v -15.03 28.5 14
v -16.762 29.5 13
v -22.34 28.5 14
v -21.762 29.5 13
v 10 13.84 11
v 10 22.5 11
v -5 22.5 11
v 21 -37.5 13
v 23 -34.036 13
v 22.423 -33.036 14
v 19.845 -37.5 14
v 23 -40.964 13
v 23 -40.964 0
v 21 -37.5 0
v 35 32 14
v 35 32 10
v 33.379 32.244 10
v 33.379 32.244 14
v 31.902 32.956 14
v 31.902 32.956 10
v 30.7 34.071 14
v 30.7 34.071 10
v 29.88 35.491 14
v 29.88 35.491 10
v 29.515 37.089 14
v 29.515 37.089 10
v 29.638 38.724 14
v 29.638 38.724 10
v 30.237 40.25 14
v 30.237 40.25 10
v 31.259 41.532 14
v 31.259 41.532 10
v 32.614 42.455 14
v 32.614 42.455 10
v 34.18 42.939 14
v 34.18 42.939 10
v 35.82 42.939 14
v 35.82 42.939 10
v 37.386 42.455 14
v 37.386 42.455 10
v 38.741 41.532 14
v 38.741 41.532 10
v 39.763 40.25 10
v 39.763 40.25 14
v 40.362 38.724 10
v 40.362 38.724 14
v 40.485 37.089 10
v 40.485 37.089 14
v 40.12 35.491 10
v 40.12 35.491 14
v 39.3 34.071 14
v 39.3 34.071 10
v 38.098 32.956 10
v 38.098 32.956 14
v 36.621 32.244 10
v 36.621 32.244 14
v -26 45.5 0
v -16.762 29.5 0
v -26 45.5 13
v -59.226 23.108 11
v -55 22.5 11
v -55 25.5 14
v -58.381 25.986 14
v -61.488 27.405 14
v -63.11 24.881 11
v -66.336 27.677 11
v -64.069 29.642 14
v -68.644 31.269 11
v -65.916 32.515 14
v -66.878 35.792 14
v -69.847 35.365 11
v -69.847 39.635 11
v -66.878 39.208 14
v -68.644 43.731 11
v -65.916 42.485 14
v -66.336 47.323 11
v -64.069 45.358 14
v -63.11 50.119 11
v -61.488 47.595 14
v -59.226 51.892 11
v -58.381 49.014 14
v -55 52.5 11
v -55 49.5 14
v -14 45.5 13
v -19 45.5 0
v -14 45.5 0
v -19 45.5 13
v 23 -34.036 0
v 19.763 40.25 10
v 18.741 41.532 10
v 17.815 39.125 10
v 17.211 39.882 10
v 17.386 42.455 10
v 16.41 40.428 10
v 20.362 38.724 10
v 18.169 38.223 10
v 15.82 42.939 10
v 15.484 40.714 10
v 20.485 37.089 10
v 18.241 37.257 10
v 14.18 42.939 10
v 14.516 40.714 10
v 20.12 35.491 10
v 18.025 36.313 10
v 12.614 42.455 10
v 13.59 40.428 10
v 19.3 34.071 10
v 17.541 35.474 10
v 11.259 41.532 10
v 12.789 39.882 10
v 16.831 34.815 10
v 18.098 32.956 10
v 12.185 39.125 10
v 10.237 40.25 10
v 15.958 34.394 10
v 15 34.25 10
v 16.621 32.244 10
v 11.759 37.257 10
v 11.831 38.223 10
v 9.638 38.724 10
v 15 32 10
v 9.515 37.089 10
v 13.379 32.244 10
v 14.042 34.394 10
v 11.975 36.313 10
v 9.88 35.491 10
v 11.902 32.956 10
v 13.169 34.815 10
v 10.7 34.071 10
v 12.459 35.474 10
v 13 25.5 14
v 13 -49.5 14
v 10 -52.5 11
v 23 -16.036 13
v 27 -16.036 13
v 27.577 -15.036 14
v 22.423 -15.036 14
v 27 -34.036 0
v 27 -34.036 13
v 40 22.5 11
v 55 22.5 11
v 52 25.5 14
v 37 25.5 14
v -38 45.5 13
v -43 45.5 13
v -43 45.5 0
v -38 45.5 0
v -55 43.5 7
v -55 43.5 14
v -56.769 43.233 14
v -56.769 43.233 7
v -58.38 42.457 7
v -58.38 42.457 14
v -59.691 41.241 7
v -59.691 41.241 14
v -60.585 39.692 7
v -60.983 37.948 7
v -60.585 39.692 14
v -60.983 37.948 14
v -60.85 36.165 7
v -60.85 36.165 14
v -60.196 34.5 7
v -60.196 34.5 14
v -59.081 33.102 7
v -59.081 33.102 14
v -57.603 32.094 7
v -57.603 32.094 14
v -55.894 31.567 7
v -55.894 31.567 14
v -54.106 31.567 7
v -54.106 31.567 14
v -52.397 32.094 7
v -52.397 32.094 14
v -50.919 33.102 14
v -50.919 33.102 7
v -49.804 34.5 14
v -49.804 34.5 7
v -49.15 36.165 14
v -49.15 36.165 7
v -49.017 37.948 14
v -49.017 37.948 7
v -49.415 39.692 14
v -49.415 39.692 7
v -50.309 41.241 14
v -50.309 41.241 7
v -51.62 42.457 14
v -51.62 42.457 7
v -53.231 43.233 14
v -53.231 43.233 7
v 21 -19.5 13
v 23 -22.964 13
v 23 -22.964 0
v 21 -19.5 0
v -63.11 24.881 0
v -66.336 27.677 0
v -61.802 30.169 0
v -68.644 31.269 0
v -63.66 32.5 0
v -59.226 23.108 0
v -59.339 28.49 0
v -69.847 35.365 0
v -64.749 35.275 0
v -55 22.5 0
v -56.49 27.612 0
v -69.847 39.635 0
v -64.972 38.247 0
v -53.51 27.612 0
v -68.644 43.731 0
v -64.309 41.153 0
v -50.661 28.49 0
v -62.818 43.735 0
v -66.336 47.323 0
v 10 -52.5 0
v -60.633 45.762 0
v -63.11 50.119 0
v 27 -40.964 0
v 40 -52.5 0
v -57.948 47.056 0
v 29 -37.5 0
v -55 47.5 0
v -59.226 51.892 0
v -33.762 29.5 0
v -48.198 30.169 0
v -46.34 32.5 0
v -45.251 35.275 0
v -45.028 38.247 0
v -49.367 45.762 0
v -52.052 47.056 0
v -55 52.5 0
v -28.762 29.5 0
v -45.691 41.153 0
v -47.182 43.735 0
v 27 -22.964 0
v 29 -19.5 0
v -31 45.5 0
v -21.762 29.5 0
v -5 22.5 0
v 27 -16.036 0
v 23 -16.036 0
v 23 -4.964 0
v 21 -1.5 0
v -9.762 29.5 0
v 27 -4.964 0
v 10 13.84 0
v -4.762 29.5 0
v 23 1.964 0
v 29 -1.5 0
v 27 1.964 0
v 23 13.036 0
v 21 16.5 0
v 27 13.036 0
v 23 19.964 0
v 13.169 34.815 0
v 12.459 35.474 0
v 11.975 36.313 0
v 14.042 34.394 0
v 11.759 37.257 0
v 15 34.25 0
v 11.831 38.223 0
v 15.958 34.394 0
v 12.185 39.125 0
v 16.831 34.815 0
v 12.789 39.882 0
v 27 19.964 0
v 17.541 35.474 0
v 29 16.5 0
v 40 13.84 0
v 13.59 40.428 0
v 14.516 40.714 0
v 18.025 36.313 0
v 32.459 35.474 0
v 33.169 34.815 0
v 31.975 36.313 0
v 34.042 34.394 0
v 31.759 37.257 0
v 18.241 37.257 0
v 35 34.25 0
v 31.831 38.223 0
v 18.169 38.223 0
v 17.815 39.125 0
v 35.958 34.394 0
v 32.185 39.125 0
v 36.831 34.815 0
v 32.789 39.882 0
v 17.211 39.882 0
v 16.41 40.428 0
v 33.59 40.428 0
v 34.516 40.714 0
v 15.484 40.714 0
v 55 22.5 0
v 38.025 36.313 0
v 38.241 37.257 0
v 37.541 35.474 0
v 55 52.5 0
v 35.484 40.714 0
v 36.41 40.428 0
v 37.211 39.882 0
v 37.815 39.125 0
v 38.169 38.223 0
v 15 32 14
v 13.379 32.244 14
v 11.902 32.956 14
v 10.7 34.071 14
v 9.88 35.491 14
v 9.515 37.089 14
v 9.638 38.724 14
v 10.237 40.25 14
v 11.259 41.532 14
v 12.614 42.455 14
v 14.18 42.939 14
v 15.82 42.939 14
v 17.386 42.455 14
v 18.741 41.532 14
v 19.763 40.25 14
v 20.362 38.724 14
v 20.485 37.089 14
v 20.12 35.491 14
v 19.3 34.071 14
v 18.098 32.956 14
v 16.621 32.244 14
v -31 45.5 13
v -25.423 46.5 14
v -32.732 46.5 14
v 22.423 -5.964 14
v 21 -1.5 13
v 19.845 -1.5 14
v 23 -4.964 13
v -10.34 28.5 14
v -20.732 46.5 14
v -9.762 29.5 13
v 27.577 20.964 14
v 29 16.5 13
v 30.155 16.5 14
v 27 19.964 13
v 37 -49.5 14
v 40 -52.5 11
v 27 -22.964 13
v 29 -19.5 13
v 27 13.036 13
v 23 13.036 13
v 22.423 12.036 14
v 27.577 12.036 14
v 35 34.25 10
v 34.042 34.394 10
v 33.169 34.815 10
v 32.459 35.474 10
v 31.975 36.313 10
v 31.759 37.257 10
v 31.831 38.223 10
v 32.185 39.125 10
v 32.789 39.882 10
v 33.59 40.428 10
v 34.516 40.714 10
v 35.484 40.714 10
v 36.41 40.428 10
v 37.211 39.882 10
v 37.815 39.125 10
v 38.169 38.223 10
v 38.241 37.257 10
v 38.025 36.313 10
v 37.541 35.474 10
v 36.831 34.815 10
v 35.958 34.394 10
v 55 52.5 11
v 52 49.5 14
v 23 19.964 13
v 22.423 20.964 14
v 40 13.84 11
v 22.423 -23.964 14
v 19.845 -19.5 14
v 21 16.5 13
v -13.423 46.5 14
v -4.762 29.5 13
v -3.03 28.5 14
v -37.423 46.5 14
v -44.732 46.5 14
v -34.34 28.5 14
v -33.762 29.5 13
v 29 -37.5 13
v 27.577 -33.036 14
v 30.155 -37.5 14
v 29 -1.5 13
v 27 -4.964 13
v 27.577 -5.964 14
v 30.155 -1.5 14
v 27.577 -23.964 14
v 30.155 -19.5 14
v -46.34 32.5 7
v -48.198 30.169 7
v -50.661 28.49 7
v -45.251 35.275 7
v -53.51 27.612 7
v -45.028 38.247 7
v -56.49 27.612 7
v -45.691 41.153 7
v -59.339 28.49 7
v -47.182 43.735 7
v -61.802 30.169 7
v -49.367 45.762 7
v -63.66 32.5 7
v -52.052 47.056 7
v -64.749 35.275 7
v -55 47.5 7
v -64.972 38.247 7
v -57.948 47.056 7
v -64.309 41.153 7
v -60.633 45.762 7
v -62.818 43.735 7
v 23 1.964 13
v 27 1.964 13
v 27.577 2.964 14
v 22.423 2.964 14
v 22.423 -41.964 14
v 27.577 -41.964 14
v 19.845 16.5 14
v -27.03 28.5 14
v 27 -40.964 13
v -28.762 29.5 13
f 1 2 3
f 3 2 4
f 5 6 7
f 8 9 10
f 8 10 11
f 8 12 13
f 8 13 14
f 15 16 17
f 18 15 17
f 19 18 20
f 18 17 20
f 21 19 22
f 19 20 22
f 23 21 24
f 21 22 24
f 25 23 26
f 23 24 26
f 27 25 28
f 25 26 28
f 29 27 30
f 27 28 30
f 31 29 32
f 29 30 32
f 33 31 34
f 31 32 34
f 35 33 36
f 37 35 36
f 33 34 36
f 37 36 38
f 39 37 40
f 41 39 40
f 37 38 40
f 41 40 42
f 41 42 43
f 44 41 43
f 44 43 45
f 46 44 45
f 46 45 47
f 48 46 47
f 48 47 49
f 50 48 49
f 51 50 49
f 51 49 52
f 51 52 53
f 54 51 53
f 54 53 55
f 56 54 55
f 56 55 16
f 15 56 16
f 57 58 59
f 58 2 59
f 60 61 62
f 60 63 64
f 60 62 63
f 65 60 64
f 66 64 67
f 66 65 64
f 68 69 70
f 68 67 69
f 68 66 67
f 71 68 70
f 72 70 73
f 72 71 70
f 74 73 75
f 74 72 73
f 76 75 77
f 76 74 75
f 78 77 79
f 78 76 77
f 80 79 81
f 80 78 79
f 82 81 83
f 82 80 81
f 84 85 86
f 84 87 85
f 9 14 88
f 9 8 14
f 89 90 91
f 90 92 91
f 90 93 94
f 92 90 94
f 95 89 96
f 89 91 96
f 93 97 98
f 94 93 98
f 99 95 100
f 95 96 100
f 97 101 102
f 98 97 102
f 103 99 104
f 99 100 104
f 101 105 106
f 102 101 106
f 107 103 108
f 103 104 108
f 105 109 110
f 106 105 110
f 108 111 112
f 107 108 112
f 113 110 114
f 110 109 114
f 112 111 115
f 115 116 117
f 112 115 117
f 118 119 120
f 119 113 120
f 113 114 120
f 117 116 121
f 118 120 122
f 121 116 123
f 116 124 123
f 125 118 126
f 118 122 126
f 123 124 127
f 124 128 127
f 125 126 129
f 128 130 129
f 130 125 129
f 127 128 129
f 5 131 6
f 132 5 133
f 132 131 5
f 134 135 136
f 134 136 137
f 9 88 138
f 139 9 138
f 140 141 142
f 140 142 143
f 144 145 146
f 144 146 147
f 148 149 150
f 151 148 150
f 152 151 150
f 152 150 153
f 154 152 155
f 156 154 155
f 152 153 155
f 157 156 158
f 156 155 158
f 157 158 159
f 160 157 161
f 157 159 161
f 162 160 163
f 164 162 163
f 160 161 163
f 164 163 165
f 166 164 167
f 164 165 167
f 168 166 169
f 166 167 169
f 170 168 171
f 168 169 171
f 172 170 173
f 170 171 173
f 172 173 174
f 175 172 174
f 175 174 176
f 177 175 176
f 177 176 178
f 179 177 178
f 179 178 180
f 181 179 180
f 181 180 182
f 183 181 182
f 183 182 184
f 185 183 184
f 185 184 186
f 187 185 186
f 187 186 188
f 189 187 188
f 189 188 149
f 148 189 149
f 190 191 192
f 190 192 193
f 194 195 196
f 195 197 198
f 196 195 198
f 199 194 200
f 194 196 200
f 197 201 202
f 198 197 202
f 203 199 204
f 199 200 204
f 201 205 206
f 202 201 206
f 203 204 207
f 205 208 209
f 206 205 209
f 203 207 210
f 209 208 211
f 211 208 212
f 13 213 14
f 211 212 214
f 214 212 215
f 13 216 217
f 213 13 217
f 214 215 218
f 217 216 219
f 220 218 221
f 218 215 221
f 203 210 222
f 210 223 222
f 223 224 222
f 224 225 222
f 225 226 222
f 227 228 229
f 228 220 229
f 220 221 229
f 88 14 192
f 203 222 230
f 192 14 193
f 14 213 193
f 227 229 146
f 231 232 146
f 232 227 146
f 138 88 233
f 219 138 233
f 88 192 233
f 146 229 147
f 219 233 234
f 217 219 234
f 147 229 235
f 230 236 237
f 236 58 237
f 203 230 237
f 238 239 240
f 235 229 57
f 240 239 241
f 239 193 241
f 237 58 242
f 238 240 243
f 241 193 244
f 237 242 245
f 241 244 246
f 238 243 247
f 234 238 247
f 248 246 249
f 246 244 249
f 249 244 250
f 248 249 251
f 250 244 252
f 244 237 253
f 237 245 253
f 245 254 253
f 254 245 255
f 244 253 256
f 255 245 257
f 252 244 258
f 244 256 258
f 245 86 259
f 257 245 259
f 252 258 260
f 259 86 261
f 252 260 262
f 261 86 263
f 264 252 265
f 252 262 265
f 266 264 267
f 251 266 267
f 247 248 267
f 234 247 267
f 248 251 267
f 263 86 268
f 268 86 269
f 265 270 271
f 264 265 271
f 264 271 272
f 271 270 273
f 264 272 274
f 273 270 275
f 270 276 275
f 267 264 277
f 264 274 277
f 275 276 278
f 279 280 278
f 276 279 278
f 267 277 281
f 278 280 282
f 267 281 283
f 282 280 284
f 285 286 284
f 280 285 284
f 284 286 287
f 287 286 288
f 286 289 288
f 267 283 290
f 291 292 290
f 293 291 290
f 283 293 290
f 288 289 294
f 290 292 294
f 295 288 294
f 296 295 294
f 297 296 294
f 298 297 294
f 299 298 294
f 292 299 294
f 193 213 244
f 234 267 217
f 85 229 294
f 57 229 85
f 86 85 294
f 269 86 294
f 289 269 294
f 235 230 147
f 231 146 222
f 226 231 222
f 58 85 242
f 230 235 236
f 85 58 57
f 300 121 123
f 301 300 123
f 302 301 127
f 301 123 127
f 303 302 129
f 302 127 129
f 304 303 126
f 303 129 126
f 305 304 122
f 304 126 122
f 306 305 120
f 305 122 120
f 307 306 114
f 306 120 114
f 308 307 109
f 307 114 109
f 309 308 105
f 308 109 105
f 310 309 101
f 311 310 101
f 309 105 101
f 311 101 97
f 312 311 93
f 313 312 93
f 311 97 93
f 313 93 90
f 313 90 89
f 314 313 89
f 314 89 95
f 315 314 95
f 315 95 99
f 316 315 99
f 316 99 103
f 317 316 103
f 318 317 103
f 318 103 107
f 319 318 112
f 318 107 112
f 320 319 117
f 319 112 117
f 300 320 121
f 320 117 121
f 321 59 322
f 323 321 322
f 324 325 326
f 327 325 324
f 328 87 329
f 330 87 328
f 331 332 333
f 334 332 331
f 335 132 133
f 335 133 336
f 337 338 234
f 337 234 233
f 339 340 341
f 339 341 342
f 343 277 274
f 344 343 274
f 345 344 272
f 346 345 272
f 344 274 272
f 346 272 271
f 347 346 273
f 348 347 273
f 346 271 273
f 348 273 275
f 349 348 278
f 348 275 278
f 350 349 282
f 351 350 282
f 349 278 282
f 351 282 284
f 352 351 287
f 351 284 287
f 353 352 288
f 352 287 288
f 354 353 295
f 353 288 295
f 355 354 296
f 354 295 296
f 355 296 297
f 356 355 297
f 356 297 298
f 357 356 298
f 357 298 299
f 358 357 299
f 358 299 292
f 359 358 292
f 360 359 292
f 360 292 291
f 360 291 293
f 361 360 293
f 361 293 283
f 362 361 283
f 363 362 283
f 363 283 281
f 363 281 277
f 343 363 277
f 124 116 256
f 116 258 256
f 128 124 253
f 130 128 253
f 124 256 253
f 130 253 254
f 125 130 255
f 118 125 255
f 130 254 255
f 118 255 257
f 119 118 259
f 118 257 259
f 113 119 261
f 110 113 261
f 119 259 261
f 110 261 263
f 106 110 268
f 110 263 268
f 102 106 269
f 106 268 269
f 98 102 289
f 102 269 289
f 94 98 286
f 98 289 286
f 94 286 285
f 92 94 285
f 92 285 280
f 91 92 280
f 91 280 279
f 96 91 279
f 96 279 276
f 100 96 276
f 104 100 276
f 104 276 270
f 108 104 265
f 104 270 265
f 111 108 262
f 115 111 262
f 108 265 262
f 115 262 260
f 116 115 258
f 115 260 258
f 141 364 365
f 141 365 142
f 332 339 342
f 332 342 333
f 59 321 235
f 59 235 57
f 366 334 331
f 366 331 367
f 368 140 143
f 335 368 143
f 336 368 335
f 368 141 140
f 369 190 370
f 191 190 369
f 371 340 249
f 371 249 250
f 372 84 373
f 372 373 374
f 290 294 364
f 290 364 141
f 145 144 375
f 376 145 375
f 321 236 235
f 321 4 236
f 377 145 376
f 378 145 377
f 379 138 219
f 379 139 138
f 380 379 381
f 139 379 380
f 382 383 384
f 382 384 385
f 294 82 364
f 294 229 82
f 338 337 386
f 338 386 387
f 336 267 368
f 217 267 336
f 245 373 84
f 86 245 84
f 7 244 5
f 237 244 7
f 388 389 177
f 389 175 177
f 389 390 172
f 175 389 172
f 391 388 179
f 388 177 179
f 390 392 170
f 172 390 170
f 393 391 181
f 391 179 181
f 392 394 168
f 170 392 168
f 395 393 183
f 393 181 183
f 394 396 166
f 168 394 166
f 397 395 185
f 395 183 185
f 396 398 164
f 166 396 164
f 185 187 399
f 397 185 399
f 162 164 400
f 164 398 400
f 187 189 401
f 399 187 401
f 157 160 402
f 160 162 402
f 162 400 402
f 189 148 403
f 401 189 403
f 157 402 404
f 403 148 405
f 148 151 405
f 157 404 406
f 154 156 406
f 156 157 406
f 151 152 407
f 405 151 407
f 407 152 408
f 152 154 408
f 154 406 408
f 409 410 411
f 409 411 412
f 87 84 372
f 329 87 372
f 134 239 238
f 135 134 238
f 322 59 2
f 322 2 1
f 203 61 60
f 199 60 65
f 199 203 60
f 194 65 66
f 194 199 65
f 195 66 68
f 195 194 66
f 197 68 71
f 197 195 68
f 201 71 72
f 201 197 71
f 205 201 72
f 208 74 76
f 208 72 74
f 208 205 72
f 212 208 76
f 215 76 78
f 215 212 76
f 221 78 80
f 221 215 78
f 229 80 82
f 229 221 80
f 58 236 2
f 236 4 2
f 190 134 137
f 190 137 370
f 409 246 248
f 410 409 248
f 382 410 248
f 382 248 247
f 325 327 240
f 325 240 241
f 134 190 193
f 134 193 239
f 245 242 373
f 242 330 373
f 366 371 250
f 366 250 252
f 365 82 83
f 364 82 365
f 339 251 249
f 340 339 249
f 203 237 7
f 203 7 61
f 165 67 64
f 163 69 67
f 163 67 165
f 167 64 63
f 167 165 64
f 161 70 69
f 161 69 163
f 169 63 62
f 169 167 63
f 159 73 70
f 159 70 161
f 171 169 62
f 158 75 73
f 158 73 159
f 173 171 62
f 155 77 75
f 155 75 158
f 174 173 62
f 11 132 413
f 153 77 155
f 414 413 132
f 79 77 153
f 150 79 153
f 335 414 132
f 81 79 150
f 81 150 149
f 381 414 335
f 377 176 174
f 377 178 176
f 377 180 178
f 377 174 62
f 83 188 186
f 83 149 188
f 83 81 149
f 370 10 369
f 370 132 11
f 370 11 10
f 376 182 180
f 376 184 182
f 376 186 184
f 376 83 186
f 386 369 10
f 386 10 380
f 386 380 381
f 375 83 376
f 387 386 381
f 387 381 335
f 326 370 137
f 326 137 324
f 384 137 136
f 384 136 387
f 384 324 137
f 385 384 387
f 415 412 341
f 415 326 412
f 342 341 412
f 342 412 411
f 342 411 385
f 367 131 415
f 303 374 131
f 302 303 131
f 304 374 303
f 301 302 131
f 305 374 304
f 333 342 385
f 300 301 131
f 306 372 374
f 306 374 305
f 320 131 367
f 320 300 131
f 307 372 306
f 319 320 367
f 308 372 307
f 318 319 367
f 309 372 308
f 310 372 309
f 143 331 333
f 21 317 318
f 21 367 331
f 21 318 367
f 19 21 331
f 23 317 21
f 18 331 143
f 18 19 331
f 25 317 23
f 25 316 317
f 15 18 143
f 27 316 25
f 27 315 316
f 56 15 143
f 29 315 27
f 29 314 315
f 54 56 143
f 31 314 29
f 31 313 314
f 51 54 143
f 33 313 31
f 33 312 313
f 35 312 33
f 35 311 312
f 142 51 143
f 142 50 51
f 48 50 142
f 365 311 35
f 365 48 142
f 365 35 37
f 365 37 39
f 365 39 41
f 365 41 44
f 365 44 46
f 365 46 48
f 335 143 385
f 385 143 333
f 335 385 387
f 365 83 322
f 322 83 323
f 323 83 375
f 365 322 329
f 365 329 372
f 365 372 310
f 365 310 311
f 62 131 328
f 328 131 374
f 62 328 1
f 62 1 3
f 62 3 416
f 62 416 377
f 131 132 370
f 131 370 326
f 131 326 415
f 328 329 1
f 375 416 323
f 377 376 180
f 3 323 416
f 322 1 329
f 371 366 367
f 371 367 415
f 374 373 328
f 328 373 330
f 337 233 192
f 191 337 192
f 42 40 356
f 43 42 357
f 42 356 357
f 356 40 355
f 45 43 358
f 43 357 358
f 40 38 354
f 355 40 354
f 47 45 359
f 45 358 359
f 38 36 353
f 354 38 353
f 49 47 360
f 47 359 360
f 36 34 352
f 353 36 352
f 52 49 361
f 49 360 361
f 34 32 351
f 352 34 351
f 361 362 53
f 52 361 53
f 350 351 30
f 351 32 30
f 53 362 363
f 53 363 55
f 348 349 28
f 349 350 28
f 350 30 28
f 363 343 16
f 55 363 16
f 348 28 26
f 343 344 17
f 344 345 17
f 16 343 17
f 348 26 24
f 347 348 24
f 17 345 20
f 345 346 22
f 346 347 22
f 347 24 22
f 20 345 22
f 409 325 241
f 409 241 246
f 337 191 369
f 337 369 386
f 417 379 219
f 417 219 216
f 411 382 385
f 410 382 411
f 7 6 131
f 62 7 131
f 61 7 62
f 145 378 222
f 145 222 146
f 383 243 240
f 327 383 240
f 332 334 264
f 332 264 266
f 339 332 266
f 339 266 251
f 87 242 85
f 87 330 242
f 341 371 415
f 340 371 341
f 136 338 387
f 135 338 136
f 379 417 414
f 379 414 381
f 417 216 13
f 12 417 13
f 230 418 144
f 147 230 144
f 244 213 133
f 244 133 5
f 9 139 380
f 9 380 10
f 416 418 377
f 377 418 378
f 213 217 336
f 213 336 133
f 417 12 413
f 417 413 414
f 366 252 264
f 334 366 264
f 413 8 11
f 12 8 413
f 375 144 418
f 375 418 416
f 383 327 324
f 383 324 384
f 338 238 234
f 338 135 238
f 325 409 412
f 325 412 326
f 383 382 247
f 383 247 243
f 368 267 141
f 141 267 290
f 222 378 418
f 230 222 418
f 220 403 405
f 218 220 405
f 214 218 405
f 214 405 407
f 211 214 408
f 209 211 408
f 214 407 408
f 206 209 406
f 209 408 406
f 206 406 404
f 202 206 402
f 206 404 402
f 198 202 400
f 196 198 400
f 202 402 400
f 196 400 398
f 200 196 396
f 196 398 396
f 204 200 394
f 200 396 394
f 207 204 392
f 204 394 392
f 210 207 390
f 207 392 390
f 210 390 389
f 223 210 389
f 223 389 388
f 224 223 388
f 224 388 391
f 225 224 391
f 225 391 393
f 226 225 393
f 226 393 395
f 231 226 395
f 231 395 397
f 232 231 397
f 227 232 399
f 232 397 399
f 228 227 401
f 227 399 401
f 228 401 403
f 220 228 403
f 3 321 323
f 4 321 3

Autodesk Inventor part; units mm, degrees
ref_plane "YZ Plane" through (0, 0, 0) normal (1, 0, 0) x (0, 1, 0)
ref_plane "XZ Plane" through (0, 0, 0) normal (0, 1, 0) x (-1, 0, 0)
sketch "Náčrt1" plane through (0, 0, 0) normal (0, 0, 1) x (1, 0, 0)
  line L0 (-95, 0) -> (80, 0) projected
  line L1 (0, -73.5) -> (0, 73.5) projected
  line L2 (-55, 52.5) -> (55, 52.5)
  line L3 (55, 52.5) -> (55, 22.5)
  line L4 (55, 22.5) -> (-55, 22.5)
  line L5 (-55, 22.5) -> (-55, 52.5)
  line L6 (40, -52.5) -> (10, -52.5)
  line L7 (10, -52.5) -> (10, 22.5)
  line L8 (10, 22.5) -> (40, 22.5)
  line L9 (40, 22.5) -> (40, -52.5)
  circle A0 centre (-55, 37.5) radius 15
  point P0 (0, 0)
  dimension "d0" = 30
  dimension "d1" = 110
  dimension "d2" = 30
  dimension "d3" = 15
  dimension "d4" = 75
extrude "Vysunutí1" add sketch "Náčrt1" along normal blind 14 contours L7 L4 L9 L0 | L0 L9 L6 L7 | L4 A0 L2 L1 | L1 L2 L3 L4 | A0 L5 | L5 A0
sketch "Náčrt2" plane through (0, 0, 0) normal (0, 0, -1) x (-1, 0, 0)
  line L0 (-55, 52.5) -> (55, 52.5) projected
  line L1 (-55, 52.5) -> (55, 52.5) projected
  line L2 (-55, 22.5) -> (-55, 52.5) projected
  line L3 (-40, 22.5) -> (-55, 22.5) projected
  line L4 (-40, -52.5) -> (-40, 22.5) projected
  line L5 (-10, -52.5) -> (-40, -52.5) projected
  line L6 (-10, 22.5) -> (-10, -52.5) projected
  line L7 (55, 22.5) -> (-10, 22.5) projected
  arc A0 (55, 22.5) -> (55, 52.5) centre (55, 37.5) ccw projected
  point P0 (0, 0)
hole "Díra1" at (-55, 37.5, 0) direction (0, 0, 1) diameter 12 end through all counterbore diameter 20 counterbore depth 7
chamfer "Zkosení1" distance 3 angle 45 8 edges at (0, 52.5, 14) (-70, 37.5, 14) (-22.5, 22.5, 14) (10, -15, 14) (40, -15, 14) (47.5, 22.5, 14) (55, 37.5, 14) (25, -52.5, 14)
sketch "Náčrt3" plane through (0, 0, 14) normal (0, 0, 1) x (1, 0, 0)
  circle A0 centre (-55, 37.5) radius 6 projected
  line L0 (-55, 49.5) -> (52, 49.5) projected
  arc A1 (-55, 49.5) -> (-55, 25.5) centre (-55, 37.5) ccw projected
  line L1 (13, 25.5) -> (-55, 25.5) projected
  line L2 (13, -49.5) -> (13, 25.5) projected
  line L3 (37, -49.5) -> (13, -49.5) projected
  line L4 (37, 25.5) -> (37, -49.5) projected
  line L5 (52, 25.5) -> (37, 25.5) projected
  line L6 (52, 49.5) -> (52, 25.5) projected
  line L7 (0, 73.5) -> (0, -73.5) projected
  line L8 (-95, 0) -> (80, 0) projected
  point P0 (0, 0)
  point P1 (35, 37.5)
  dimension "d17" = 12
  dimension "d18" = 17
hole "Díra2" at (35, 37.5, 14) direction (0, 0, -1) diameter 6.5 end through all counterbore diameter 11 counterbore depth 4 clearance for "Strojní šroub se zápustnou hlavou" size "M6" standard "Ansi M metrický profil"
pattern_linear "Obdélníkové pole1" count 2 spacing 20 along (-1, 0, 0) of "Díra2"
sketch "Náčrt4" plane through (0, 0, 14) normal (0, 0, 1) x (1, 0, 0)
  line L0 (-95, 0) -> (80, 0) projected
  line L1 (0, -73.5) -> (0, 73.5) projected
  circle A0 centre (15, 37.5) radius 5.5 projected
  circle A1 centre (35, 37.5) radius 5.5 projected
  circle A2 centre (-55, 37.5) radius 6 projected
  line L2 (-55, 49.5) -> (52, 49.5) projected
  arc A3 (-55, 49.5) -> (-55, 25.5) centre (-55, 37.5) ccw projected
  line L3 (13, 25.5) -> (-55, 25.5) projected
  line L4 (13, -49.5) -> (13, 25.5) projected
  line L5 (37, -49.5) -> (13, -49.5) projected
  line L6 (37, 25.5) -> (37, -49.5) projected
  line L7 (52, 25.5) -> (37, 25.5) projected
  line L8 (52, 49.5) -> (52, 25.5) projected
  line L9 (-33.7624, 29.5) -> (-28.7624, 29.5)
  line L10 (-28.7624, 29.5) -> (-38, 45.5)
  line L11 (-28.7624, 29.5) -> (-10.2872, 29.5) construction
  line L12 (-33.7624, 29.5) -> (-43, 45.5)
  line L13 (-43, 45.5) -> (-38, 45.5)
  point P0 (0, 0)
  dimension "d29" = 120
  dimension "d31" = 5
  dimension "d32" = 4
  dimension "d33" = 4
  dimension "d34" = 12
extrude "Vysunutí2" cut sketch "Náčrt4" against normal through all contours L12 L13 L10 L9
chamfer "Zkosení2" distance 1 angle 45 4 edges at (-38.3812, 37.5, 14) (-40.5, 45.5, 14) (-33.3812, 37.5, 14) (-31.2624, 29.5, 14)
pattern_linear "Obdélníkové pole2" count 3 spacing 12 along (1, 0, 0) of "Vysunutí2", "Zkosení2"
sketch "Náčrt5" plane through (0, 0, 14) normal (0, 0, 1) x (1, 0, 0)
  line L0 (-32.7321, 46.5) -> (-22.3397, 28.5) projected
  line L1 (-25.4226, 46.5) -> (-32.7321, 46.5) projected
  line L2 (-15.0303, 28.5) -> (-25.4226, 46.5) projected
  line L3 (-22.3397, 28.5) -> (-15.0303, 28.5) projected
  line L4 (-55, 49.5) -> (52, 49.5) projected
  arc A0 (-55, 49.5) -> (-55, 25.5) centre (-55, 37.5) ccw projected
  line L5 (13, 25.5) -> (-55, 25.5) projected
  line L6 (13, -49.5) -> (13, 25.5) projected
  line L7 (37, -49.5) -> (13, -49.5) projected
  line L8 (37, 25.5) -> (37, -49.5) projected
  line L9 (52, 25.5) -> (37, 25.5) projected
  line L10 (52, 49.5) -> (52, 25.5) projected
  circle A1 centre (-55, 37.5) radius 6 projected
  circle A2 centre (35, 37.5) radius 5.5 projected
  circle A3 centre (15, 37.5) radius 5.5 projected
  line L11 (-27.0303, 28.5) -> (-37.4226, 46.5) projected
  line L12 (-34.3397, 28.5) -> (-27.0303, 28.5) projected
  line L13 (-44.7321, 46.5) -> (-34.3397, 28.5) projected
  line L14 (-37.4226, 46.5) -> (-44.7321, 46.5) projected
  line L15 (-20.7321, 46.5) -> (-10.3397, 28.5) projected
  line L16 (-13.4226, 46.5) -> (-20.7321, 46.5) projected
  line L17 (-3.0303, 28.5) -> (-13.4226, 46.5) projected
  line L18 (-10.3397, 28.5) -> (-3.0303, 28.5) projected
  line L19 (0, -73.5) -> (0, 73.5) projected
  line L20 (27, 19.9641) -> (29, 16.5)
  line L21 (29, 16.5) -> (27, 13.0359)
  line L22 (27, 13.0359) -> (23, 13.0359)
  line L23 (23, 13.0359) -> (21, 16.5)
  line L24 (21, 16.5) -> (23, 19.9641)
  line L25 (23, 19.9641) -> (27, 19.9641)
  point P0 (0, 0)
  point P1 (25, 16.5)
  dimension "d43" = 4
  dimension "d44" = 9
  dimension "d45" = 12
  dimension "d52" = 3.4641
extrude "Vysunutí3" cut sketch "Náčrt5" against normal through all contours L20 L21 L22 L23 L24 L25
chamfer "Zkosení3" distance 1 angle 45 6 edges at (25, 19.9641, 14) (28, 18.2321, 14) (28, 14.7679, 14) (25, 13.0359, 14) (22, 14.7679, 14) (22, 18.2321, 14)
pattern_linear "Obdélníkové pole3" count 4 spacing 18 along (0, -1, 0) of "Vysunutí3", "Zkosení3"
ref_plane "Pracovní rovina1" through (0, 0, 0) normal (0, 0, -1) x (-1, 0, 0)
sketch "Náčrt7" plane through (0, 0, 0) normal (0, 0, -1) x (-1, 0, 0)
  line L0 (-29, -37.5) -> (-27, -34.0359) projected
  line L1 (-27, -34.0359) -> (-23, -34.0359) projected
  line L2 (-23, -34.0359) -> (-21, -37.5) projected
  line L3 (-21, -37.5) -> (-23, -40.9641) projected
  line L4 (-23, -40.9641) -> (-27, -40.9641) projected
  line L5 (-27, -40.9641) -> (-29, -37.5) projected
  line L6 (-29, -19.5) -> (-27, -16.0359) projected
  line L7 (-27, -16.0359) -> (-23, -16.0359) projected
  line L8 (-23, -16.0359) -> (-21, -19.5) projected
  line L9 (-21, -19.5) -> (-23, -22.9641) projected
  line L10 (-23, -22.9641) -> (-27, -22.9641) projected
  line L11 (-27, -22.9641) -> (-29, -19.5) projected
  line L12 (-29, -1.5) -> (-27, 1.9641) projected
  line L13 (-27, 1.9641) -> (-23, 1.9641) projected
  line L14 (-23, 1.9641) -> (-21, -1.5) projected
  line L15 (-21, -1.5) -> (-23, -4.9641) projected
  line L16 (-23, -4.9641) -> (-27, -4.9641) projected
  line L17 (-27, -4.9641) -> (-29, -1.5) projected
  line L18 (-21, 16.5) -> (-23, 13.0359) projected
  line L19 (-23, 13.0359) -> (-27, 13.0359) projected
  line L20 (-27, 13.0359) -> (-29, 16.5) projected
  line L21 (-29, 16.5) -> (-27, 19.9641) projected
  line L22 (-27, 19.9641) -> (-23, 19.9641) projected
  line L23 (-23, 19.9641) -> (-21, 16.5) projected
  line L24 (19, 45.5) -> (9.7624, 29.5) projected
  line L25 (9.7624, 29.5) -> (4.7624, 29.5) projected
  line L26 (4.7624, 29.5) -> (14, 45.5) projected
  line L27 (14, 45.5) -> (19, 45.5) projected
  line L28 (31, 45.5) -> (21.7624, 29.5) projected
  line L29 (21.7624, 29.5) -> (16.7624, 29.5) projected
  line L30 (16.7624, 29.5) -> (26, 45.5) projected
  line L31 (26, 45.5) -> (31, 45.5) projected
  line L32 (28.7624, 29.5) -> (38, 45.5) projected
  line L33 (38, 45.5) -> (43, 45.5) projected
  line L34 (43, 45.5) -> (33.7624, 29.5) projected
  line L35 (33.7624, 29.5) -> (28.7624, 29.5) projected
  circle A0 centre (-15, 37.5) radius 3.25 projected
  circle A1 centre (-35, 37.5) radius 3.25 projected
  circle A2 centre (55, 37.5) radius 10 projected
  line L36 (-55, 52.5) -> (55, 52.5) projected
  line L37 (-55, 22.5) -> (-55, 52.5) projected
  line L38 (-40, 22.5) -> (-55, 22.5) projected
  line L39 (-40, -52.5) -> (-40, 22.5) projected
  line L40 (-10, -52.5) -> (-40, -52.5) projected
  line L41 (-10, 22.5) -> (-10, -52.5) projected
  line L42 (55, 22.5) -> (-10, 22.5) projected
  arc A3 (55, 22.5) -> (55, 52.5) centre (55, 37.5) ccw projected
  line L43 (-40, 13.8397) -> (-55, 22.5)
  line L44 (-10, 13.8397) -> (5, 22.5)
  line L45 (-10, 22.5) -> (-10, -52.5) projected
  line L46 (-10, 13.8397) -> (-10, 22.5)
  line L47 (-10, 22.5) -> (5, 22.5)
  line L48 (-40, -52.5) -> (-40, 22.5) projected
  line L49 (-40, 13.8397) -> (-40, 22.5)
  line L50 (-40, 22.5) -> (-55, 22.5)
  point P0 (0, 0)
  dimension "d68" = 15
  dimension "d69" = 15
  dimension "d70" = 30
  dimension "d71" = 30
extrude "Vysunutí4" add sketch "Náčrt7" against normal blind 11 contours L38 L39 L43 | L44 L41 L42
properties part number "blet_leg_30x30_3D tisk"
